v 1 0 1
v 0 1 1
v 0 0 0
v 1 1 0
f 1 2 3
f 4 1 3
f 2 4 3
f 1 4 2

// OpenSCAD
module layout(rows=1, scale=2) {
    for (child = [0:$children-1]) {
        x = floor(child / rows);
        y = child % rows;
        translate([x*scale, y*scale, 0]) children(child);
    }
}

// Avoid non-triangular faces (i.e. squares on a cube).
// Those can be triangulated in multiple ways, which makes
// comparison against a reference object harder.
module tetra() {
    polyhedron(
        [[0, 0, 0], [0, 1, 1], [1, 0, 1], [1, 1, 0]],
        [[0, 1, 2], [0, 2, 3], [0, 3, 1], [1, 3, 2]]
    );
}

tetra();
